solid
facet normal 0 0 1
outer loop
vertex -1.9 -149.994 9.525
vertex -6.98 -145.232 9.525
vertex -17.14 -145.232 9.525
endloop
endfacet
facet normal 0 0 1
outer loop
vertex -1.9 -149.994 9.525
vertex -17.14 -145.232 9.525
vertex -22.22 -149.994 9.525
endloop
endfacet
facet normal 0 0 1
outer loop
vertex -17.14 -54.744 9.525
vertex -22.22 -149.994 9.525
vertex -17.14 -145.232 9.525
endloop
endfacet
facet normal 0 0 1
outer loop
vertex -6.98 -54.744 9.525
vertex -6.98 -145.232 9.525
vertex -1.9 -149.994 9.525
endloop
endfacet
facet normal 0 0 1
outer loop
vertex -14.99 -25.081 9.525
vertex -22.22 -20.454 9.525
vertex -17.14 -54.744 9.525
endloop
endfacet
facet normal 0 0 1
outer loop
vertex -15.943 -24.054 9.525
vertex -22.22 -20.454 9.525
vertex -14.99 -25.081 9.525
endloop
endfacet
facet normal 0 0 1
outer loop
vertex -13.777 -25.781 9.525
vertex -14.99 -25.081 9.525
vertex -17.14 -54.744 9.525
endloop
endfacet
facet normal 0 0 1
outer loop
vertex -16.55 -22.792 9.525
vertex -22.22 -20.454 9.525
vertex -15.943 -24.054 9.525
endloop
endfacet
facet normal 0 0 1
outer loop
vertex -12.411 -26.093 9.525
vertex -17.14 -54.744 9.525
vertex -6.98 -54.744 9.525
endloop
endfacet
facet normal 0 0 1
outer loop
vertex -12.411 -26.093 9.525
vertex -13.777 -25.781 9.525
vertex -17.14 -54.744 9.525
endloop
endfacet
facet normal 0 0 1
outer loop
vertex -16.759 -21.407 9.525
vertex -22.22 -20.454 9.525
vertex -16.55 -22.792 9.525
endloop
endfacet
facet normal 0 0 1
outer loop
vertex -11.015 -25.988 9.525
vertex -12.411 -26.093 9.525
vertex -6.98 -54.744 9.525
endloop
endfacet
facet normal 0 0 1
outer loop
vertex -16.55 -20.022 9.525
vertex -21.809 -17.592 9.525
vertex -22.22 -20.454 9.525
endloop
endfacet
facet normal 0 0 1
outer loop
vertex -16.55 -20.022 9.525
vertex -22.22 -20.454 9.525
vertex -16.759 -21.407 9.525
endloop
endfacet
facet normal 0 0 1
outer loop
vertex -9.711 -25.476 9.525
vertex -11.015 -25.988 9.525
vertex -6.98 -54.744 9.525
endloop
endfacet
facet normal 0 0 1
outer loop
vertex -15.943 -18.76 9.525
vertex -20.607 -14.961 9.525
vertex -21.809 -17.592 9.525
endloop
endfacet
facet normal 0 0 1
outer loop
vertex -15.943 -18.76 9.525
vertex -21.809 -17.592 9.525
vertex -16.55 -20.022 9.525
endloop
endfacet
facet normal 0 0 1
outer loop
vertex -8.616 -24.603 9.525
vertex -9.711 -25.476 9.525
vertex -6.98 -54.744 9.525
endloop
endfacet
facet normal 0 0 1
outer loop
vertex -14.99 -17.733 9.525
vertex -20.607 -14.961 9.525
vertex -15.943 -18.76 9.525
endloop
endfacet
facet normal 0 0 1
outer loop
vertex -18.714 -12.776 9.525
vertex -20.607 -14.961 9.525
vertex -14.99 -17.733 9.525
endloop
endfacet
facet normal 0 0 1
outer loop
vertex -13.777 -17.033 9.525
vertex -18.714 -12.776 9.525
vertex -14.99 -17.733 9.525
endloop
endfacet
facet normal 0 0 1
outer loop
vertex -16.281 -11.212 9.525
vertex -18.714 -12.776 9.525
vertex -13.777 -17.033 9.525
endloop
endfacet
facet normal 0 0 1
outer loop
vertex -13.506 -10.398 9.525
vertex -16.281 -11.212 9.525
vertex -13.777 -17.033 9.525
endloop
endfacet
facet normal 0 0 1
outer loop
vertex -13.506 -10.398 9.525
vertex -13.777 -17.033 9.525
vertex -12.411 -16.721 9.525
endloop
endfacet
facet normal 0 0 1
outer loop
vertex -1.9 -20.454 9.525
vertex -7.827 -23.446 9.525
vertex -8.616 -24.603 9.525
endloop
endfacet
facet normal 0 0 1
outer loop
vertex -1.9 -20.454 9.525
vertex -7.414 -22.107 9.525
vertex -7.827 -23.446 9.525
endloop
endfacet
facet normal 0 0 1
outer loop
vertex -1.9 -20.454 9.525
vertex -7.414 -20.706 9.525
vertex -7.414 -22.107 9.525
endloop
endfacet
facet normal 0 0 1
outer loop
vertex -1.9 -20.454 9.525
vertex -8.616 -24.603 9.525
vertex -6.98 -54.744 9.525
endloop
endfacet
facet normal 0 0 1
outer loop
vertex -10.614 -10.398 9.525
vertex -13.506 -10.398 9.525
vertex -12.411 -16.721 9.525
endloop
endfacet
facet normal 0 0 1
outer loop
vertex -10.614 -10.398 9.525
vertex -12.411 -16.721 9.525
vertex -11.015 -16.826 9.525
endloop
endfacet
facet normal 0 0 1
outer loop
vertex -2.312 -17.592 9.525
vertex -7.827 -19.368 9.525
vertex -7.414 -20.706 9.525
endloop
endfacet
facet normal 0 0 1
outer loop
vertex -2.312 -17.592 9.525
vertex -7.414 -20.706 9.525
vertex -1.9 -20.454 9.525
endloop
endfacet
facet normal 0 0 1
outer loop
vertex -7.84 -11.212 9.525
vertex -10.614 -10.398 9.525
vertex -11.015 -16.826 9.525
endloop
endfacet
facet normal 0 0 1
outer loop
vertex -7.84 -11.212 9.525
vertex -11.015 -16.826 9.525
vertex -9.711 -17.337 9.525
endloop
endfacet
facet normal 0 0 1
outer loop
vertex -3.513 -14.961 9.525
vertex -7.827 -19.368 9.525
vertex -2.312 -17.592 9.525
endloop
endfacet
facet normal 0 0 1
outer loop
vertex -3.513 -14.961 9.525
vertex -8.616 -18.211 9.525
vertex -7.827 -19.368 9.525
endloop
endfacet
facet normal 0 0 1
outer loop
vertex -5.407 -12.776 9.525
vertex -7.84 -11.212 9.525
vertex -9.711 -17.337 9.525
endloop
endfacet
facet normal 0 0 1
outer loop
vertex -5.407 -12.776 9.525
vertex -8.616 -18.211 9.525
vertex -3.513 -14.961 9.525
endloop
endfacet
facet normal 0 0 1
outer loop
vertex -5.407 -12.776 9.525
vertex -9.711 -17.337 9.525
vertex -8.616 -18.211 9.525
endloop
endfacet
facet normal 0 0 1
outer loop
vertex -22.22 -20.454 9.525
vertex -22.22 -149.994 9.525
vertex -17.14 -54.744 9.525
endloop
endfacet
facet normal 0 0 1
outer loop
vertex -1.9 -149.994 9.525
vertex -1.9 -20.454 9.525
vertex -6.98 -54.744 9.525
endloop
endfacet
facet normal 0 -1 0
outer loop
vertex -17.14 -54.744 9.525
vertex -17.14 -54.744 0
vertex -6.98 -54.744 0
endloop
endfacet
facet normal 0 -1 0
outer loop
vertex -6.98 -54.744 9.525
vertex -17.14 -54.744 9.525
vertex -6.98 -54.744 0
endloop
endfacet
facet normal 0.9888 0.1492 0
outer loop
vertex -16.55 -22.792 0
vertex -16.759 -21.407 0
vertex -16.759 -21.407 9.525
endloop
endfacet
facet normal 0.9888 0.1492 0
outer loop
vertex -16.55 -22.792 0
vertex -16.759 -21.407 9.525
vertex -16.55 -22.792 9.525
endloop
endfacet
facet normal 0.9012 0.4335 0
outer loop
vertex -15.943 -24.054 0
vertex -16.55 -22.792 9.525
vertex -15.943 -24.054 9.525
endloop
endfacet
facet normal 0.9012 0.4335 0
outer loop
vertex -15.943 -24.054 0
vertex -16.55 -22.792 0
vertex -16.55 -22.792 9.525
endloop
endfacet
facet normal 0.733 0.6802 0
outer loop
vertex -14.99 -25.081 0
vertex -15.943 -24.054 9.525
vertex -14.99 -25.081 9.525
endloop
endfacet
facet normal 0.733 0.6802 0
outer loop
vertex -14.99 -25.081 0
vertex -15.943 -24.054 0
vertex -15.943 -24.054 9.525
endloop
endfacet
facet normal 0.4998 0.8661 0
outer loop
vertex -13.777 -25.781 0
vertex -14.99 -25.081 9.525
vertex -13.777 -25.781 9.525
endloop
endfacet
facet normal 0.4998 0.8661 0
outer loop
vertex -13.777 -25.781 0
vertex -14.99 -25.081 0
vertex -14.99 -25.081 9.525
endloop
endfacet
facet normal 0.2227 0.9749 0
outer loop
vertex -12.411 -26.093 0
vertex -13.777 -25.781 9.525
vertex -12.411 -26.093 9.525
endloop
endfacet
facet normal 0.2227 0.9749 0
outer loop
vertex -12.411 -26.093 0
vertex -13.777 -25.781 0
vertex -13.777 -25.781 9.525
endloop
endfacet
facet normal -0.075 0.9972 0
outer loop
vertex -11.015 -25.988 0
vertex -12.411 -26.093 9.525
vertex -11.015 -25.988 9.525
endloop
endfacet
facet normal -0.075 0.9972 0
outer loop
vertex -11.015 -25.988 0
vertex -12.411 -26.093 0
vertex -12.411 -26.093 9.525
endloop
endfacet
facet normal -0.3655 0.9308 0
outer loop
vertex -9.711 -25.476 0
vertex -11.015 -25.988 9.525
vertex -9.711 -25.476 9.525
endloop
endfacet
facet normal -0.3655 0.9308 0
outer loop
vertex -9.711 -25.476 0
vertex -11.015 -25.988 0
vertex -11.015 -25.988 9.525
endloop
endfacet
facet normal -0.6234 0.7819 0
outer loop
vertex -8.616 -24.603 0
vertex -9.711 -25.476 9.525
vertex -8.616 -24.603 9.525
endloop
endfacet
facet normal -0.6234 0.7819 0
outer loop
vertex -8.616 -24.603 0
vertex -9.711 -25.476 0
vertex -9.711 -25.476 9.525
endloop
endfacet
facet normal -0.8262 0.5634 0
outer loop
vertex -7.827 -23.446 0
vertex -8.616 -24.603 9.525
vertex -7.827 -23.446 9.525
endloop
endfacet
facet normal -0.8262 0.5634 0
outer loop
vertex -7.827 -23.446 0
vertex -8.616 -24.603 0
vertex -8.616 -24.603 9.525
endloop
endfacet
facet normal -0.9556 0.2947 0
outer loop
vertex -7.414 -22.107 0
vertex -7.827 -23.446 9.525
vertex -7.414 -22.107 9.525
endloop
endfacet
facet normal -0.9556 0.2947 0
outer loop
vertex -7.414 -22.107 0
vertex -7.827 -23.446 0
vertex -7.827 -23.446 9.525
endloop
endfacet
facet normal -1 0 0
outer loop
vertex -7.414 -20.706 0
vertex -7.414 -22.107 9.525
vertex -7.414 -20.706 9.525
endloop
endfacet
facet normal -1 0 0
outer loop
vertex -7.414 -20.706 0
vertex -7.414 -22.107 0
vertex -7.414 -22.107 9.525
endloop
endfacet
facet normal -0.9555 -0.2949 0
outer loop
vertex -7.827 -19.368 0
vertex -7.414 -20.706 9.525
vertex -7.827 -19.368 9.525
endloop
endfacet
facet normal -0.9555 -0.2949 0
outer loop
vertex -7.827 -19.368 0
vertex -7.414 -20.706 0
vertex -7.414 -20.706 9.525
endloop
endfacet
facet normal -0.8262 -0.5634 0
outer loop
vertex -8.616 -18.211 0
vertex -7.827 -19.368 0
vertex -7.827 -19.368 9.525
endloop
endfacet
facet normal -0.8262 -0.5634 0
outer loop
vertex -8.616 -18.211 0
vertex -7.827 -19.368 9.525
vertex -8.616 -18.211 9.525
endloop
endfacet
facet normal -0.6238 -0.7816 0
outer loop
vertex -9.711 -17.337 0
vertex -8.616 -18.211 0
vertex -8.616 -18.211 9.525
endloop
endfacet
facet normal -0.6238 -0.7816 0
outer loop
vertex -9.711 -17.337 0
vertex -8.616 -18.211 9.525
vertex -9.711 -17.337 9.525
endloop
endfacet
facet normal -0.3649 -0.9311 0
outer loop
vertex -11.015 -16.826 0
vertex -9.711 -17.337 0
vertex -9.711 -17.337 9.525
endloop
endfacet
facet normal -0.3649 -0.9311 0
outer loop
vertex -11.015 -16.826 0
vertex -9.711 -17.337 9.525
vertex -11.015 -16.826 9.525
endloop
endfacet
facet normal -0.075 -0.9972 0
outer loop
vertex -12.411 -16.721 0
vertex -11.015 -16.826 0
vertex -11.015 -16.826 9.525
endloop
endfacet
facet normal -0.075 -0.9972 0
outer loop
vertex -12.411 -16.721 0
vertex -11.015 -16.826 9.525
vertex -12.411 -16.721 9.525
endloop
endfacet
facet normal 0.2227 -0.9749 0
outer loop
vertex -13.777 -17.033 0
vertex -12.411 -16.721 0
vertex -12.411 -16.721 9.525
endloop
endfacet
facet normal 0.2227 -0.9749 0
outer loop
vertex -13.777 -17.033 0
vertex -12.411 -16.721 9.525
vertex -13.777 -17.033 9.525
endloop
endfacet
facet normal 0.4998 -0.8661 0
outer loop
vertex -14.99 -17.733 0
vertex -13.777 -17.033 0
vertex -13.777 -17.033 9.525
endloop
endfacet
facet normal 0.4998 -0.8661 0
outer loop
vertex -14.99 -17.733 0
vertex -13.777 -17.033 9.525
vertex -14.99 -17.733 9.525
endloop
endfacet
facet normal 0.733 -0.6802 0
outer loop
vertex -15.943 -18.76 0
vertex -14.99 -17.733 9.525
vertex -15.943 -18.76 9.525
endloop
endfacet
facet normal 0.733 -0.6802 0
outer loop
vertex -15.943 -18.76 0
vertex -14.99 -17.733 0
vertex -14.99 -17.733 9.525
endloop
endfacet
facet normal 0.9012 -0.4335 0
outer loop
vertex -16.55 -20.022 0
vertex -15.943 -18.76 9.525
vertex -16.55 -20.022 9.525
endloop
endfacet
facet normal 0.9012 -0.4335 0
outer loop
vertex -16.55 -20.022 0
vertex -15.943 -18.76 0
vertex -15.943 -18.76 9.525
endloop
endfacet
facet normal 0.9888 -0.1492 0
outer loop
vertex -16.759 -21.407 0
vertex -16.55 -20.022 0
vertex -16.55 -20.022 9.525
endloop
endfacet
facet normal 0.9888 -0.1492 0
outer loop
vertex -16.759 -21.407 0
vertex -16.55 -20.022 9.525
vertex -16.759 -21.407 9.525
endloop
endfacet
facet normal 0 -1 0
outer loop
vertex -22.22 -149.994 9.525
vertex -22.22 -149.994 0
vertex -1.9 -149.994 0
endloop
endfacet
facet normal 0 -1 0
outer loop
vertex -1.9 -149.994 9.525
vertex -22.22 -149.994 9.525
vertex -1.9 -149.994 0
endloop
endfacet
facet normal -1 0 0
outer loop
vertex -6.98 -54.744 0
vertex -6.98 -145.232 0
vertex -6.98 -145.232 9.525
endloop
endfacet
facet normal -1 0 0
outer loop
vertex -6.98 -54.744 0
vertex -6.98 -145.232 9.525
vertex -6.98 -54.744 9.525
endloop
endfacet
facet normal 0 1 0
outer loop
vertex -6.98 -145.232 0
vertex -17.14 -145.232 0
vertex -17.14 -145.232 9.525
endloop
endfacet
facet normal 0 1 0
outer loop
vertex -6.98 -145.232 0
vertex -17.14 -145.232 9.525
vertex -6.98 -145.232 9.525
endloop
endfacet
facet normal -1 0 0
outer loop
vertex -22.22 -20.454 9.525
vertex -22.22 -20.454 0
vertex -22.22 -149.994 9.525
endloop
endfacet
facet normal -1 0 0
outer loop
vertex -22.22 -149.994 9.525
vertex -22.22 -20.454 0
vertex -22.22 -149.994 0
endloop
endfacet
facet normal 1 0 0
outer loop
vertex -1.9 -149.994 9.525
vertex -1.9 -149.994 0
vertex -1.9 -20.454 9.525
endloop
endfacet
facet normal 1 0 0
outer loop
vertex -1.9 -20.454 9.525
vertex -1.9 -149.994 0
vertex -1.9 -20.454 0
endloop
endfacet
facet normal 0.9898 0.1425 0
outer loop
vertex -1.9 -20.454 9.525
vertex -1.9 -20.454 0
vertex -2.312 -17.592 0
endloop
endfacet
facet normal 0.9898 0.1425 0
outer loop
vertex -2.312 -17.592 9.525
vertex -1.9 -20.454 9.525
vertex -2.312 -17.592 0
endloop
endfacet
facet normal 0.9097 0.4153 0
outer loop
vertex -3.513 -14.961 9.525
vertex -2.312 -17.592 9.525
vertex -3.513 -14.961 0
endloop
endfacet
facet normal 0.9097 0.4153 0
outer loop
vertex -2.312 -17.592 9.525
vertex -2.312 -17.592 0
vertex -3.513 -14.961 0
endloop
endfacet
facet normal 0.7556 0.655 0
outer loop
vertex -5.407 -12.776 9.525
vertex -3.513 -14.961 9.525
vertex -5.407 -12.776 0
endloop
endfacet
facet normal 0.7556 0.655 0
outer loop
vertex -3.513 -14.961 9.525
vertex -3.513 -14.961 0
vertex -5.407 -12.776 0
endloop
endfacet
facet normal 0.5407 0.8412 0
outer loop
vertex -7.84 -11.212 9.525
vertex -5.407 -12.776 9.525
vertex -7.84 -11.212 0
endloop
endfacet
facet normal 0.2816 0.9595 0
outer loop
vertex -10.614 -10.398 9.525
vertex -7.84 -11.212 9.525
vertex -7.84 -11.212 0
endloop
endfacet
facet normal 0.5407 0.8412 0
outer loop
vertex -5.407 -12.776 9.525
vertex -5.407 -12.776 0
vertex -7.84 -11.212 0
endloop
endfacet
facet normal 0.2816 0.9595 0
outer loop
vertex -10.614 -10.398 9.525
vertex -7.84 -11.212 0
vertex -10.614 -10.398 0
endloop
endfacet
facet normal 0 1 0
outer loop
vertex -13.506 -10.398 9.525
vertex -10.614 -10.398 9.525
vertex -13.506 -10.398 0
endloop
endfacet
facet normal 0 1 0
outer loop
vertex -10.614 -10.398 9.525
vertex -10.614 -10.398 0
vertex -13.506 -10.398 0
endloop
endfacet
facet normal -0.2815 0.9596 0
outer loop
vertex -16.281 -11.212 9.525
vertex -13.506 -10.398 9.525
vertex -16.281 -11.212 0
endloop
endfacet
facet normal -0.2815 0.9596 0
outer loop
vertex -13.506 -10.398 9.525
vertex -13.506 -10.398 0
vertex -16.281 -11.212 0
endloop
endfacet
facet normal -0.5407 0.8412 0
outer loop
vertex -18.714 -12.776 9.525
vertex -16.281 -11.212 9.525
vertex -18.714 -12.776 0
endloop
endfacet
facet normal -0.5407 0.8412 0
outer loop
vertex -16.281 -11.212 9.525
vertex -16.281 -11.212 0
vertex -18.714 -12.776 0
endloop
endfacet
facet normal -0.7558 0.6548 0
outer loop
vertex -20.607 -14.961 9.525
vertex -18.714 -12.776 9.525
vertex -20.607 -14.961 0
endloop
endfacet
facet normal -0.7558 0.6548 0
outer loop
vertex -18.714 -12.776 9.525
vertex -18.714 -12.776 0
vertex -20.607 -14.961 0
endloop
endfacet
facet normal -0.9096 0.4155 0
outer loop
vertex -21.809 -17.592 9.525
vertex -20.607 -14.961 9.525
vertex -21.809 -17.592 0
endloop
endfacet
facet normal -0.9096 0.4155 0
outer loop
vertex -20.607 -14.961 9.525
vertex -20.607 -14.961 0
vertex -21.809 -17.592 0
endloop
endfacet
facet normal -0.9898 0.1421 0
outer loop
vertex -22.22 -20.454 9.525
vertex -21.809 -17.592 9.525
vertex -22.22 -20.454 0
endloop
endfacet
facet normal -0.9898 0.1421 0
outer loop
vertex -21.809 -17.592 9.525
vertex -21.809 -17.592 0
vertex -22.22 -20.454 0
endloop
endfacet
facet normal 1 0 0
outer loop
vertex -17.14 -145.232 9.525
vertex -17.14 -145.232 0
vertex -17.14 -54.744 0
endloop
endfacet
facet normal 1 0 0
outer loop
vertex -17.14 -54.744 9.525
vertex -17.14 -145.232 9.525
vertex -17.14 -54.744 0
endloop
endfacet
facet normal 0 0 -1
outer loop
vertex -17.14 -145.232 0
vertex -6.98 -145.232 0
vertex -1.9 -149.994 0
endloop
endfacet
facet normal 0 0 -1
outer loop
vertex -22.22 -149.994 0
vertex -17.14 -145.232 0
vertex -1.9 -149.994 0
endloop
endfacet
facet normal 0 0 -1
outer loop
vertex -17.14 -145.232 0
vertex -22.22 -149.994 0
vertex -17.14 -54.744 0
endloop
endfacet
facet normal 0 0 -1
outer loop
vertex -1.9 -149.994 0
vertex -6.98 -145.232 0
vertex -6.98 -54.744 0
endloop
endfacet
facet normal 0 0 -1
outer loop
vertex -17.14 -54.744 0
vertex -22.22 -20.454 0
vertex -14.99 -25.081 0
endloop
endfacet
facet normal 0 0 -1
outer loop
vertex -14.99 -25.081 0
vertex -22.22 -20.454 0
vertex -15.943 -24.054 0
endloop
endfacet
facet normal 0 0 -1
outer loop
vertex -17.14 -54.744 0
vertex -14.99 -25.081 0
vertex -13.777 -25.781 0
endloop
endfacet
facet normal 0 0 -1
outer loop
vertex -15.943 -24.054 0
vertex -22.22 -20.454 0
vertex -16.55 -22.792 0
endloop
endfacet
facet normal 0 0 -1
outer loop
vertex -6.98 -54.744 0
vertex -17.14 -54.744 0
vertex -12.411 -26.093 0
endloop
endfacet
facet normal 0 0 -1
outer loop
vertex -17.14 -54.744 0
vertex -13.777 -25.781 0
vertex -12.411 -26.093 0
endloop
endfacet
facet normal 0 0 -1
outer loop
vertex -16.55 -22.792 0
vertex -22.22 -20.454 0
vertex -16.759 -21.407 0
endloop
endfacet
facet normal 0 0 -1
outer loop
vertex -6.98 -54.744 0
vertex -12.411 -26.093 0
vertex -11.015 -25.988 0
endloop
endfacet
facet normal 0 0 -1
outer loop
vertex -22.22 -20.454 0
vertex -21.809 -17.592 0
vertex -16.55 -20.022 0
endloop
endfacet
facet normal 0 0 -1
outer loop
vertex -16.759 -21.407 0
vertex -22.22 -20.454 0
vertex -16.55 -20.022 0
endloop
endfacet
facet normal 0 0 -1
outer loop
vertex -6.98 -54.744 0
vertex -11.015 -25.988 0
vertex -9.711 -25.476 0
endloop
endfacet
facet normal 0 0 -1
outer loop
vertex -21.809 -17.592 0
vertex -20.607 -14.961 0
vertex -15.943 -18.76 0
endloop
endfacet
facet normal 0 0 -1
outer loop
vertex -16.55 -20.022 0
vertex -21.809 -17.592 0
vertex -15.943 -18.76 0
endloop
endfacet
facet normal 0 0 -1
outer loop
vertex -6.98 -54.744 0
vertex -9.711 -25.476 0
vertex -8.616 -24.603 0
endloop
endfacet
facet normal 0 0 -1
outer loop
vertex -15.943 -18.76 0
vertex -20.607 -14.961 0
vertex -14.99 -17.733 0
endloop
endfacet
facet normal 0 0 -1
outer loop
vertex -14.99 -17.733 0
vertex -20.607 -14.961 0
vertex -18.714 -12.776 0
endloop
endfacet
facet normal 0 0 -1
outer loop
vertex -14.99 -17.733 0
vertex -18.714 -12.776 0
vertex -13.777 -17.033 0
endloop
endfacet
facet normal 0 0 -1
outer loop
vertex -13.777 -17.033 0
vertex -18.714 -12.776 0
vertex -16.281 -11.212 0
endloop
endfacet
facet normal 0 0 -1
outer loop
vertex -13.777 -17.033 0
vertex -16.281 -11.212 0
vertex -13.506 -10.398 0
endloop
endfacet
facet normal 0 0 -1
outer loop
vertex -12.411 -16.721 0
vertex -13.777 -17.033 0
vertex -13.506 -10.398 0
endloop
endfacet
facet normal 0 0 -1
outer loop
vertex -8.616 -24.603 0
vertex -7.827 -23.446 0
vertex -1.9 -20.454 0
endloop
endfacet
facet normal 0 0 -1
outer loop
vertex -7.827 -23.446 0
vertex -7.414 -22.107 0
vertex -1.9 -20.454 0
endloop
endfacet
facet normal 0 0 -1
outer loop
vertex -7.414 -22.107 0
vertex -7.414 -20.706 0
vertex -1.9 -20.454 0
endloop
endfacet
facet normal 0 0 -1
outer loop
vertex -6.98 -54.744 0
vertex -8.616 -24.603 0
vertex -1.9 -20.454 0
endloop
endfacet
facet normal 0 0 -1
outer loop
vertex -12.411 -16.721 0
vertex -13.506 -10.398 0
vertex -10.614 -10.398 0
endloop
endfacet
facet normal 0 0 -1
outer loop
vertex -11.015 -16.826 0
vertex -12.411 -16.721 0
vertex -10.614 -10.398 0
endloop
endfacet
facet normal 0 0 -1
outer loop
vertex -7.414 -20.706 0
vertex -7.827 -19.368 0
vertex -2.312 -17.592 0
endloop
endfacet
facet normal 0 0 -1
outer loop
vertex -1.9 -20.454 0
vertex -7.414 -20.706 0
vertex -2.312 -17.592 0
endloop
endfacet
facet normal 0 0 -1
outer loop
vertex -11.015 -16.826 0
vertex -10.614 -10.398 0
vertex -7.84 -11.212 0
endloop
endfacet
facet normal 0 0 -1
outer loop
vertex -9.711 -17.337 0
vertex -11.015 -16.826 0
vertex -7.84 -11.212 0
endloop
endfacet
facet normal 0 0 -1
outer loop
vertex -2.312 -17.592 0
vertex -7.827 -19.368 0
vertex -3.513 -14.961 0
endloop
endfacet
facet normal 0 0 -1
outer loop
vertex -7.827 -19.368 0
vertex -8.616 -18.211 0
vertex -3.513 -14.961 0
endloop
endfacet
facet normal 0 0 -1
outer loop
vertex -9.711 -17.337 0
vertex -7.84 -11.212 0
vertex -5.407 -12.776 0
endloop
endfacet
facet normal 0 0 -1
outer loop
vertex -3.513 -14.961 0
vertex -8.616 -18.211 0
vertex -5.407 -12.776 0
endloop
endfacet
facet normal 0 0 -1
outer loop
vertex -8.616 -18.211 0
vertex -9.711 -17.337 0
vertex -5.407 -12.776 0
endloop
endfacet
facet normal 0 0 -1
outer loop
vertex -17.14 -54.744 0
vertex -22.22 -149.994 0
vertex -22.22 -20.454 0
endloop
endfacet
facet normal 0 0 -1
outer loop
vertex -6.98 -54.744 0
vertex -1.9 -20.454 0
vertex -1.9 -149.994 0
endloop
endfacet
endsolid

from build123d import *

# Parameters (mm, degrees)
SKETCH2_R           = 4.699
SKETCH2_W           = 10.16
SKETCH2_H           = 90.4875
BOSS_EXTRUDE1_DEPTH = 9.525


with BuildPart() as part:
    # Sketch2 → Boss-Extrude1 (new body)
    with BuildSketch(Plane.XY):
        with BuildLine():
            Line((-22.220156591, -20.454196066), (-22.220156591, -149.994196066))
            Line((-22.220156591, -149.994196066), (-1.900156591, -149.994196066))
            Line((-1.900156591, -149.994196066), (-1.900156591, -20.454196066))
            ThreePointArc((-1.900156591, -20.454196066), (-12.060156591, -10.294196066), (-22.220156591, -20.454196066))
        make_face()
        with Locations(Location((-12.060156591, -21.406696066, 0), (0, 0, 180))):
            Circle(SKETCH2_R, mode=Mode.SUBTRACT)
        with Locations((-12.060156591, -99.987946066)):
            Rectangle(SKETCH2_W, SKETCH2_H, mode=Mode.SUBTRACT)
    extrude(amount=BOSS_EXTRUDE1_DEPTH)


solid = part.part
